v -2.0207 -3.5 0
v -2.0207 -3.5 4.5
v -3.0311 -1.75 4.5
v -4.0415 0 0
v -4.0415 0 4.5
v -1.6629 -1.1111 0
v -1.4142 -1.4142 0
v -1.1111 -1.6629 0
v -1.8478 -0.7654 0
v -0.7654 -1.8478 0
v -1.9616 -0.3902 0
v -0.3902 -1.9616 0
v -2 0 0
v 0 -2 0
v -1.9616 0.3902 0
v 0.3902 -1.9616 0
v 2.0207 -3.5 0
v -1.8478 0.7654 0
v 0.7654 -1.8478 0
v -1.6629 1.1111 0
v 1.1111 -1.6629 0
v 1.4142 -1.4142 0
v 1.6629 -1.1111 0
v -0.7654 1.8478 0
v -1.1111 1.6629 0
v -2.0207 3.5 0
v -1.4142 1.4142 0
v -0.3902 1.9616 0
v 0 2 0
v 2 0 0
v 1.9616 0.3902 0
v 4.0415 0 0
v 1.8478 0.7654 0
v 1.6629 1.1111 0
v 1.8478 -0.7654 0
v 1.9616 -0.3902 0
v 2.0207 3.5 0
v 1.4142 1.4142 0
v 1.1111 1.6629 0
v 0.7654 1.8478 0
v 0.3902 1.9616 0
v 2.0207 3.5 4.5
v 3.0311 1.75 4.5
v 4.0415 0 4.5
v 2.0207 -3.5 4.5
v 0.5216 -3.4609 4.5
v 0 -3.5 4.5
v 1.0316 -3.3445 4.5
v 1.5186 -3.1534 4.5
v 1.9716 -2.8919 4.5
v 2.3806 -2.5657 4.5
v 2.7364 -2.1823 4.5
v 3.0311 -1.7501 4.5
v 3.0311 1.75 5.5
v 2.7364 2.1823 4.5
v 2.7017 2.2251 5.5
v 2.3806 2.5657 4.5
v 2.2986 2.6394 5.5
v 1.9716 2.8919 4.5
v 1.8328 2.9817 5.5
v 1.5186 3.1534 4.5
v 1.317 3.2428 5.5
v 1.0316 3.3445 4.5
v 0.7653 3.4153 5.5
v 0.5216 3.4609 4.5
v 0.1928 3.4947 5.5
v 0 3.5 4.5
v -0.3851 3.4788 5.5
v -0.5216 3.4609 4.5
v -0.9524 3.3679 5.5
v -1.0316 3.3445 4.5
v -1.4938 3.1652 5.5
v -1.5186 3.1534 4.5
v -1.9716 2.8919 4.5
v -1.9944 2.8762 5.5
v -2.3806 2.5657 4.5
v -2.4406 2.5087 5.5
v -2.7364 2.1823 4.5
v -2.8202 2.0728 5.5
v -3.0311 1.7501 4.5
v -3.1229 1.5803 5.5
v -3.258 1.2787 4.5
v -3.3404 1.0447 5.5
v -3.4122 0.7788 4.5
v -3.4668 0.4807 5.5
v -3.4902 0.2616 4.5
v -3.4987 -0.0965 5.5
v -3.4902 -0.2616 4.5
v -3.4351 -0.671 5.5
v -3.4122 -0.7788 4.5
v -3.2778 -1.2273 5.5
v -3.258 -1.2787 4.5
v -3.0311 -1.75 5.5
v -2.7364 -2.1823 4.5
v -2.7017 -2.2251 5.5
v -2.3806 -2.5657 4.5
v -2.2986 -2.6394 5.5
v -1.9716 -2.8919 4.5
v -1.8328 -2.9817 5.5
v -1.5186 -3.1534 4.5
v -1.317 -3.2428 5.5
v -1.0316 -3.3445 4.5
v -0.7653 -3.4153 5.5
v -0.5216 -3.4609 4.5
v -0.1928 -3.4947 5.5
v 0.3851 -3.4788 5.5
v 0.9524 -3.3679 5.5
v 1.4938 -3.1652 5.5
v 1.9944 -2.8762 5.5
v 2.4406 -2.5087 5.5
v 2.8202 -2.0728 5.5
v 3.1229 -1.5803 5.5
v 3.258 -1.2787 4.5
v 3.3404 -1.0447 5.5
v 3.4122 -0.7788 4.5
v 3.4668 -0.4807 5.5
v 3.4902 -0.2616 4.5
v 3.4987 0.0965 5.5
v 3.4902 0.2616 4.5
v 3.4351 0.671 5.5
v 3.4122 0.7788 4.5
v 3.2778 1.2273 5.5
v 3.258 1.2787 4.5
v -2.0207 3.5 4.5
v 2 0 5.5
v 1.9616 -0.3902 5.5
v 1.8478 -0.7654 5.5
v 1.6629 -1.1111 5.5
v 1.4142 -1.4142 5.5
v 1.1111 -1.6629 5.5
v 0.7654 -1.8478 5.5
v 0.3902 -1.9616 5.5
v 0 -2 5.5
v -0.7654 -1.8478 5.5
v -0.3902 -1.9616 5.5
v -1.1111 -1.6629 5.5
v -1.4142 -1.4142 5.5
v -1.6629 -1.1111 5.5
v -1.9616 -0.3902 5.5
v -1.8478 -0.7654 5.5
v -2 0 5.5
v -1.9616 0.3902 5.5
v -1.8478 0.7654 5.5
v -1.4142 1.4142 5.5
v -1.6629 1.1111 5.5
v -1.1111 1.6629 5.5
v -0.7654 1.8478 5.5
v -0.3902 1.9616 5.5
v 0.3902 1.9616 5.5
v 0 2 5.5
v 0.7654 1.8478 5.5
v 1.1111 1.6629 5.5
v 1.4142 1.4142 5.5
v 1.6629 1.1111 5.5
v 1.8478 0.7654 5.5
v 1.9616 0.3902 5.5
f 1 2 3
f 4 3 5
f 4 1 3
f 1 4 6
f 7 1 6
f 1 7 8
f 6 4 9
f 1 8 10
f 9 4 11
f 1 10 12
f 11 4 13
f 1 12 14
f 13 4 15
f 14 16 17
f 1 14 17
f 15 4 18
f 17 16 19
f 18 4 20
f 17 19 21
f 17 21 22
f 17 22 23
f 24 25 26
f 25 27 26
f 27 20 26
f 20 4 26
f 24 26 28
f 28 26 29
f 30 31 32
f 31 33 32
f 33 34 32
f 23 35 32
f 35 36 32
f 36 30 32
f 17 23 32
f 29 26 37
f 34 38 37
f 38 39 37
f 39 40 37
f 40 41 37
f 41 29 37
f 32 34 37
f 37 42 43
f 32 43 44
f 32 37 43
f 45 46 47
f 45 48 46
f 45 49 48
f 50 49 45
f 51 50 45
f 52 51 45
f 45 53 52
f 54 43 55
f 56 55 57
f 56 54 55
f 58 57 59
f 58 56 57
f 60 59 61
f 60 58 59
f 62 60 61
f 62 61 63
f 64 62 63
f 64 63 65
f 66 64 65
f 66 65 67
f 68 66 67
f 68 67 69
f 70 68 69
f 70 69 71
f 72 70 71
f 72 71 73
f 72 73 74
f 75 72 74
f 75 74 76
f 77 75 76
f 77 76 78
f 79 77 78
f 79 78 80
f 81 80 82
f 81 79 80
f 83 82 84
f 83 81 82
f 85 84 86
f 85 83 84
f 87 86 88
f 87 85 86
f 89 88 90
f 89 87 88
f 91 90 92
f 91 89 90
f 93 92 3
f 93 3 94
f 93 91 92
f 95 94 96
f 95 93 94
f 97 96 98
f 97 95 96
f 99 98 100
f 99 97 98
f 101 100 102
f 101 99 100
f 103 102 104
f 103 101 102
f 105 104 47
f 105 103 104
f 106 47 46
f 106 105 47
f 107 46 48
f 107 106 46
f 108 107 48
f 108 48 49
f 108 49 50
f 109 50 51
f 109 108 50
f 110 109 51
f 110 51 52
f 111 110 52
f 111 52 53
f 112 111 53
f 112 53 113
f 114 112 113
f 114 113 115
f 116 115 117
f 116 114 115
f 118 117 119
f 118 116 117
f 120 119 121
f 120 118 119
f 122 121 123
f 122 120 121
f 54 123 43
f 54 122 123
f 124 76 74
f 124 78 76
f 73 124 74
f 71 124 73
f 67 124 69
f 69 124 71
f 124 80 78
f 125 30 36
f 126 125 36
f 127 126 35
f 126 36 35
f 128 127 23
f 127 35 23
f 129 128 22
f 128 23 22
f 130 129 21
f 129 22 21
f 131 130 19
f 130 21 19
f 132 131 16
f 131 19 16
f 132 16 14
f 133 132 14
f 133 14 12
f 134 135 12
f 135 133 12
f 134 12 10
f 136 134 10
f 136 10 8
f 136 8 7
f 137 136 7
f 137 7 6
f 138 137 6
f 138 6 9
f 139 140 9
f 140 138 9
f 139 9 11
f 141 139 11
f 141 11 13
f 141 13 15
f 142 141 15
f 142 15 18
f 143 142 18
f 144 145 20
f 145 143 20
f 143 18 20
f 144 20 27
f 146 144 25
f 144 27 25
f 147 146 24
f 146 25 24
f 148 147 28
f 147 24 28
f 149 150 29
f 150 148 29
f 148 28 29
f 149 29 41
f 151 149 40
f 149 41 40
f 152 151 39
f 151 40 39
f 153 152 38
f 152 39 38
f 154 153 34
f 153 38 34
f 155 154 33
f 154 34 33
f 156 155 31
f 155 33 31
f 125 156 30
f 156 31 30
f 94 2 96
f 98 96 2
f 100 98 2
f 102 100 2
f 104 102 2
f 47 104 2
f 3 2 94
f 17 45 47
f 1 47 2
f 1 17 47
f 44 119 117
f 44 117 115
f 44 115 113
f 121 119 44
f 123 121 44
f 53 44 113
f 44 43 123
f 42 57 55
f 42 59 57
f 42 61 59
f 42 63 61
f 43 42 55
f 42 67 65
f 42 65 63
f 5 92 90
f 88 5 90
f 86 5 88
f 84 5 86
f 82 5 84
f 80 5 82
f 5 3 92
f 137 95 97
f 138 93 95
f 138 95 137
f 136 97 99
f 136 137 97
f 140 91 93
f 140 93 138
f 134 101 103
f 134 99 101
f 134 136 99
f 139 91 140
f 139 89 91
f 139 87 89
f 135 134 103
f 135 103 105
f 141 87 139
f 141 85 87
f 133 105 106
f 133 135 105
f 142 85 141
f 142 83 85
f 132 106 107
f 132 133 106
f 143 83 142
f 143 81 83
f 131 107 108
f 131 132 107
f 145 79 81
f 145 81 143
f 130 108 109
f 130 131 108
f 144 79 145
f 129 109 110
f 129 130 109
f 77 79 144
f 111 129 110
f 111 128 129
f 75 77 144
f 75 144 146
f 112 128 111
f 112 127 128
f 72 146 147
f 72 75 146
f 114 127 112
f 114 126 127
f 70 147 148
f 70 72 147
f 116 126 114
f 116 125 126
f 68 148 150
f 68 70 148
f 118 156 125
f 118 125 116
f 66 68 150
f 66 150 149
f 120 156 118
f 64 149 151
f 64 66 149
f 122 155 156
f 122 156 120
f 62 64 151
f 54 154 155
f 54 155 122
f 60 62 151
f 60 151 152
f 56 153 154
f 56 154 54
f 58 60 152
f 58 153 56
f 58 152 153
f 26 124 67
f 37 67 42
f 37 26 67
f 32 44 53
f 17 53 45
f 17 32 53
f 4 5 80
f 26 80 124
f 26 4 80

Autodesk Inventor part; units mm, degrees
ref_plane "YZ Plane" through (0, 0, 0) normal (1, 0, 0) x (0, 1, 0)
ref_plane "XZ Plane" through (0, 0, 0) normal (0, 1, 0) x (-1, 0, 0)
ref_plane "XY Plane" through (0, 0, 0) normal (0, 0, 1) x (1, 0, 0)
sketch "スケッチ1" plane through (0, 0, 0) normal (0, 0, 1) x (1, 0, 0)
  line L0 (-2.0207, 3.5) -> (2.0207, 3.5)
  line L1 (2.0207, 3.5) -> (4.0415, 0)
  line L2 (4.0415, 0) -> (2.0207, -3.5)
  line L3 (2.0207, -3.5) -> (-2.0207, -3.5)
  line L4 (-2.0207, -3.5) -> (-4.0415, 0)
  line L5 (-4.0415, 0) -> (-2.0207, 3.5)
  circle A0 centre (0, 0) radius 2
  dimension "d0" = 7
  dimension "d1" = 4
extrude "押し出し1" add sketch "スケッチ1" along normal blind 5.5
sketch "スケッチ2" plane through (0, 0, 5.5) normal (0, 0, 1) x (1, 0, 0)
  line L0 (2.0207, 3.5) -> (-2.0207, 3.5) projected
  line L1 (-2.0207, 3.5) -> (-4.0415, 0) projected
  line L2 (-4.0415, 0) -> (-2.0207, -3.5) projected
  line L3 (-2.0207, -3.5) -> (2.0207, -3.5) projected
  line L4 (2.0207, -3.5) -> (4.0415, 0) projected
  line L5 (4.0415, 0) -> (2.0207, 3.5) projected
  circle A0 centre (0, 0) radius 3.5
extrude "押し出し2" cut sketch "スケッチ2" against normal blind 1 contours L5 A0 L0 | A0 L1 L0 | L5 L4 A0 | A0 L2 L1 | A0 L3 L2 | L4 L3 A0
properties part number "ナイロンナットm4" material "鋼、高強度、低合金"
